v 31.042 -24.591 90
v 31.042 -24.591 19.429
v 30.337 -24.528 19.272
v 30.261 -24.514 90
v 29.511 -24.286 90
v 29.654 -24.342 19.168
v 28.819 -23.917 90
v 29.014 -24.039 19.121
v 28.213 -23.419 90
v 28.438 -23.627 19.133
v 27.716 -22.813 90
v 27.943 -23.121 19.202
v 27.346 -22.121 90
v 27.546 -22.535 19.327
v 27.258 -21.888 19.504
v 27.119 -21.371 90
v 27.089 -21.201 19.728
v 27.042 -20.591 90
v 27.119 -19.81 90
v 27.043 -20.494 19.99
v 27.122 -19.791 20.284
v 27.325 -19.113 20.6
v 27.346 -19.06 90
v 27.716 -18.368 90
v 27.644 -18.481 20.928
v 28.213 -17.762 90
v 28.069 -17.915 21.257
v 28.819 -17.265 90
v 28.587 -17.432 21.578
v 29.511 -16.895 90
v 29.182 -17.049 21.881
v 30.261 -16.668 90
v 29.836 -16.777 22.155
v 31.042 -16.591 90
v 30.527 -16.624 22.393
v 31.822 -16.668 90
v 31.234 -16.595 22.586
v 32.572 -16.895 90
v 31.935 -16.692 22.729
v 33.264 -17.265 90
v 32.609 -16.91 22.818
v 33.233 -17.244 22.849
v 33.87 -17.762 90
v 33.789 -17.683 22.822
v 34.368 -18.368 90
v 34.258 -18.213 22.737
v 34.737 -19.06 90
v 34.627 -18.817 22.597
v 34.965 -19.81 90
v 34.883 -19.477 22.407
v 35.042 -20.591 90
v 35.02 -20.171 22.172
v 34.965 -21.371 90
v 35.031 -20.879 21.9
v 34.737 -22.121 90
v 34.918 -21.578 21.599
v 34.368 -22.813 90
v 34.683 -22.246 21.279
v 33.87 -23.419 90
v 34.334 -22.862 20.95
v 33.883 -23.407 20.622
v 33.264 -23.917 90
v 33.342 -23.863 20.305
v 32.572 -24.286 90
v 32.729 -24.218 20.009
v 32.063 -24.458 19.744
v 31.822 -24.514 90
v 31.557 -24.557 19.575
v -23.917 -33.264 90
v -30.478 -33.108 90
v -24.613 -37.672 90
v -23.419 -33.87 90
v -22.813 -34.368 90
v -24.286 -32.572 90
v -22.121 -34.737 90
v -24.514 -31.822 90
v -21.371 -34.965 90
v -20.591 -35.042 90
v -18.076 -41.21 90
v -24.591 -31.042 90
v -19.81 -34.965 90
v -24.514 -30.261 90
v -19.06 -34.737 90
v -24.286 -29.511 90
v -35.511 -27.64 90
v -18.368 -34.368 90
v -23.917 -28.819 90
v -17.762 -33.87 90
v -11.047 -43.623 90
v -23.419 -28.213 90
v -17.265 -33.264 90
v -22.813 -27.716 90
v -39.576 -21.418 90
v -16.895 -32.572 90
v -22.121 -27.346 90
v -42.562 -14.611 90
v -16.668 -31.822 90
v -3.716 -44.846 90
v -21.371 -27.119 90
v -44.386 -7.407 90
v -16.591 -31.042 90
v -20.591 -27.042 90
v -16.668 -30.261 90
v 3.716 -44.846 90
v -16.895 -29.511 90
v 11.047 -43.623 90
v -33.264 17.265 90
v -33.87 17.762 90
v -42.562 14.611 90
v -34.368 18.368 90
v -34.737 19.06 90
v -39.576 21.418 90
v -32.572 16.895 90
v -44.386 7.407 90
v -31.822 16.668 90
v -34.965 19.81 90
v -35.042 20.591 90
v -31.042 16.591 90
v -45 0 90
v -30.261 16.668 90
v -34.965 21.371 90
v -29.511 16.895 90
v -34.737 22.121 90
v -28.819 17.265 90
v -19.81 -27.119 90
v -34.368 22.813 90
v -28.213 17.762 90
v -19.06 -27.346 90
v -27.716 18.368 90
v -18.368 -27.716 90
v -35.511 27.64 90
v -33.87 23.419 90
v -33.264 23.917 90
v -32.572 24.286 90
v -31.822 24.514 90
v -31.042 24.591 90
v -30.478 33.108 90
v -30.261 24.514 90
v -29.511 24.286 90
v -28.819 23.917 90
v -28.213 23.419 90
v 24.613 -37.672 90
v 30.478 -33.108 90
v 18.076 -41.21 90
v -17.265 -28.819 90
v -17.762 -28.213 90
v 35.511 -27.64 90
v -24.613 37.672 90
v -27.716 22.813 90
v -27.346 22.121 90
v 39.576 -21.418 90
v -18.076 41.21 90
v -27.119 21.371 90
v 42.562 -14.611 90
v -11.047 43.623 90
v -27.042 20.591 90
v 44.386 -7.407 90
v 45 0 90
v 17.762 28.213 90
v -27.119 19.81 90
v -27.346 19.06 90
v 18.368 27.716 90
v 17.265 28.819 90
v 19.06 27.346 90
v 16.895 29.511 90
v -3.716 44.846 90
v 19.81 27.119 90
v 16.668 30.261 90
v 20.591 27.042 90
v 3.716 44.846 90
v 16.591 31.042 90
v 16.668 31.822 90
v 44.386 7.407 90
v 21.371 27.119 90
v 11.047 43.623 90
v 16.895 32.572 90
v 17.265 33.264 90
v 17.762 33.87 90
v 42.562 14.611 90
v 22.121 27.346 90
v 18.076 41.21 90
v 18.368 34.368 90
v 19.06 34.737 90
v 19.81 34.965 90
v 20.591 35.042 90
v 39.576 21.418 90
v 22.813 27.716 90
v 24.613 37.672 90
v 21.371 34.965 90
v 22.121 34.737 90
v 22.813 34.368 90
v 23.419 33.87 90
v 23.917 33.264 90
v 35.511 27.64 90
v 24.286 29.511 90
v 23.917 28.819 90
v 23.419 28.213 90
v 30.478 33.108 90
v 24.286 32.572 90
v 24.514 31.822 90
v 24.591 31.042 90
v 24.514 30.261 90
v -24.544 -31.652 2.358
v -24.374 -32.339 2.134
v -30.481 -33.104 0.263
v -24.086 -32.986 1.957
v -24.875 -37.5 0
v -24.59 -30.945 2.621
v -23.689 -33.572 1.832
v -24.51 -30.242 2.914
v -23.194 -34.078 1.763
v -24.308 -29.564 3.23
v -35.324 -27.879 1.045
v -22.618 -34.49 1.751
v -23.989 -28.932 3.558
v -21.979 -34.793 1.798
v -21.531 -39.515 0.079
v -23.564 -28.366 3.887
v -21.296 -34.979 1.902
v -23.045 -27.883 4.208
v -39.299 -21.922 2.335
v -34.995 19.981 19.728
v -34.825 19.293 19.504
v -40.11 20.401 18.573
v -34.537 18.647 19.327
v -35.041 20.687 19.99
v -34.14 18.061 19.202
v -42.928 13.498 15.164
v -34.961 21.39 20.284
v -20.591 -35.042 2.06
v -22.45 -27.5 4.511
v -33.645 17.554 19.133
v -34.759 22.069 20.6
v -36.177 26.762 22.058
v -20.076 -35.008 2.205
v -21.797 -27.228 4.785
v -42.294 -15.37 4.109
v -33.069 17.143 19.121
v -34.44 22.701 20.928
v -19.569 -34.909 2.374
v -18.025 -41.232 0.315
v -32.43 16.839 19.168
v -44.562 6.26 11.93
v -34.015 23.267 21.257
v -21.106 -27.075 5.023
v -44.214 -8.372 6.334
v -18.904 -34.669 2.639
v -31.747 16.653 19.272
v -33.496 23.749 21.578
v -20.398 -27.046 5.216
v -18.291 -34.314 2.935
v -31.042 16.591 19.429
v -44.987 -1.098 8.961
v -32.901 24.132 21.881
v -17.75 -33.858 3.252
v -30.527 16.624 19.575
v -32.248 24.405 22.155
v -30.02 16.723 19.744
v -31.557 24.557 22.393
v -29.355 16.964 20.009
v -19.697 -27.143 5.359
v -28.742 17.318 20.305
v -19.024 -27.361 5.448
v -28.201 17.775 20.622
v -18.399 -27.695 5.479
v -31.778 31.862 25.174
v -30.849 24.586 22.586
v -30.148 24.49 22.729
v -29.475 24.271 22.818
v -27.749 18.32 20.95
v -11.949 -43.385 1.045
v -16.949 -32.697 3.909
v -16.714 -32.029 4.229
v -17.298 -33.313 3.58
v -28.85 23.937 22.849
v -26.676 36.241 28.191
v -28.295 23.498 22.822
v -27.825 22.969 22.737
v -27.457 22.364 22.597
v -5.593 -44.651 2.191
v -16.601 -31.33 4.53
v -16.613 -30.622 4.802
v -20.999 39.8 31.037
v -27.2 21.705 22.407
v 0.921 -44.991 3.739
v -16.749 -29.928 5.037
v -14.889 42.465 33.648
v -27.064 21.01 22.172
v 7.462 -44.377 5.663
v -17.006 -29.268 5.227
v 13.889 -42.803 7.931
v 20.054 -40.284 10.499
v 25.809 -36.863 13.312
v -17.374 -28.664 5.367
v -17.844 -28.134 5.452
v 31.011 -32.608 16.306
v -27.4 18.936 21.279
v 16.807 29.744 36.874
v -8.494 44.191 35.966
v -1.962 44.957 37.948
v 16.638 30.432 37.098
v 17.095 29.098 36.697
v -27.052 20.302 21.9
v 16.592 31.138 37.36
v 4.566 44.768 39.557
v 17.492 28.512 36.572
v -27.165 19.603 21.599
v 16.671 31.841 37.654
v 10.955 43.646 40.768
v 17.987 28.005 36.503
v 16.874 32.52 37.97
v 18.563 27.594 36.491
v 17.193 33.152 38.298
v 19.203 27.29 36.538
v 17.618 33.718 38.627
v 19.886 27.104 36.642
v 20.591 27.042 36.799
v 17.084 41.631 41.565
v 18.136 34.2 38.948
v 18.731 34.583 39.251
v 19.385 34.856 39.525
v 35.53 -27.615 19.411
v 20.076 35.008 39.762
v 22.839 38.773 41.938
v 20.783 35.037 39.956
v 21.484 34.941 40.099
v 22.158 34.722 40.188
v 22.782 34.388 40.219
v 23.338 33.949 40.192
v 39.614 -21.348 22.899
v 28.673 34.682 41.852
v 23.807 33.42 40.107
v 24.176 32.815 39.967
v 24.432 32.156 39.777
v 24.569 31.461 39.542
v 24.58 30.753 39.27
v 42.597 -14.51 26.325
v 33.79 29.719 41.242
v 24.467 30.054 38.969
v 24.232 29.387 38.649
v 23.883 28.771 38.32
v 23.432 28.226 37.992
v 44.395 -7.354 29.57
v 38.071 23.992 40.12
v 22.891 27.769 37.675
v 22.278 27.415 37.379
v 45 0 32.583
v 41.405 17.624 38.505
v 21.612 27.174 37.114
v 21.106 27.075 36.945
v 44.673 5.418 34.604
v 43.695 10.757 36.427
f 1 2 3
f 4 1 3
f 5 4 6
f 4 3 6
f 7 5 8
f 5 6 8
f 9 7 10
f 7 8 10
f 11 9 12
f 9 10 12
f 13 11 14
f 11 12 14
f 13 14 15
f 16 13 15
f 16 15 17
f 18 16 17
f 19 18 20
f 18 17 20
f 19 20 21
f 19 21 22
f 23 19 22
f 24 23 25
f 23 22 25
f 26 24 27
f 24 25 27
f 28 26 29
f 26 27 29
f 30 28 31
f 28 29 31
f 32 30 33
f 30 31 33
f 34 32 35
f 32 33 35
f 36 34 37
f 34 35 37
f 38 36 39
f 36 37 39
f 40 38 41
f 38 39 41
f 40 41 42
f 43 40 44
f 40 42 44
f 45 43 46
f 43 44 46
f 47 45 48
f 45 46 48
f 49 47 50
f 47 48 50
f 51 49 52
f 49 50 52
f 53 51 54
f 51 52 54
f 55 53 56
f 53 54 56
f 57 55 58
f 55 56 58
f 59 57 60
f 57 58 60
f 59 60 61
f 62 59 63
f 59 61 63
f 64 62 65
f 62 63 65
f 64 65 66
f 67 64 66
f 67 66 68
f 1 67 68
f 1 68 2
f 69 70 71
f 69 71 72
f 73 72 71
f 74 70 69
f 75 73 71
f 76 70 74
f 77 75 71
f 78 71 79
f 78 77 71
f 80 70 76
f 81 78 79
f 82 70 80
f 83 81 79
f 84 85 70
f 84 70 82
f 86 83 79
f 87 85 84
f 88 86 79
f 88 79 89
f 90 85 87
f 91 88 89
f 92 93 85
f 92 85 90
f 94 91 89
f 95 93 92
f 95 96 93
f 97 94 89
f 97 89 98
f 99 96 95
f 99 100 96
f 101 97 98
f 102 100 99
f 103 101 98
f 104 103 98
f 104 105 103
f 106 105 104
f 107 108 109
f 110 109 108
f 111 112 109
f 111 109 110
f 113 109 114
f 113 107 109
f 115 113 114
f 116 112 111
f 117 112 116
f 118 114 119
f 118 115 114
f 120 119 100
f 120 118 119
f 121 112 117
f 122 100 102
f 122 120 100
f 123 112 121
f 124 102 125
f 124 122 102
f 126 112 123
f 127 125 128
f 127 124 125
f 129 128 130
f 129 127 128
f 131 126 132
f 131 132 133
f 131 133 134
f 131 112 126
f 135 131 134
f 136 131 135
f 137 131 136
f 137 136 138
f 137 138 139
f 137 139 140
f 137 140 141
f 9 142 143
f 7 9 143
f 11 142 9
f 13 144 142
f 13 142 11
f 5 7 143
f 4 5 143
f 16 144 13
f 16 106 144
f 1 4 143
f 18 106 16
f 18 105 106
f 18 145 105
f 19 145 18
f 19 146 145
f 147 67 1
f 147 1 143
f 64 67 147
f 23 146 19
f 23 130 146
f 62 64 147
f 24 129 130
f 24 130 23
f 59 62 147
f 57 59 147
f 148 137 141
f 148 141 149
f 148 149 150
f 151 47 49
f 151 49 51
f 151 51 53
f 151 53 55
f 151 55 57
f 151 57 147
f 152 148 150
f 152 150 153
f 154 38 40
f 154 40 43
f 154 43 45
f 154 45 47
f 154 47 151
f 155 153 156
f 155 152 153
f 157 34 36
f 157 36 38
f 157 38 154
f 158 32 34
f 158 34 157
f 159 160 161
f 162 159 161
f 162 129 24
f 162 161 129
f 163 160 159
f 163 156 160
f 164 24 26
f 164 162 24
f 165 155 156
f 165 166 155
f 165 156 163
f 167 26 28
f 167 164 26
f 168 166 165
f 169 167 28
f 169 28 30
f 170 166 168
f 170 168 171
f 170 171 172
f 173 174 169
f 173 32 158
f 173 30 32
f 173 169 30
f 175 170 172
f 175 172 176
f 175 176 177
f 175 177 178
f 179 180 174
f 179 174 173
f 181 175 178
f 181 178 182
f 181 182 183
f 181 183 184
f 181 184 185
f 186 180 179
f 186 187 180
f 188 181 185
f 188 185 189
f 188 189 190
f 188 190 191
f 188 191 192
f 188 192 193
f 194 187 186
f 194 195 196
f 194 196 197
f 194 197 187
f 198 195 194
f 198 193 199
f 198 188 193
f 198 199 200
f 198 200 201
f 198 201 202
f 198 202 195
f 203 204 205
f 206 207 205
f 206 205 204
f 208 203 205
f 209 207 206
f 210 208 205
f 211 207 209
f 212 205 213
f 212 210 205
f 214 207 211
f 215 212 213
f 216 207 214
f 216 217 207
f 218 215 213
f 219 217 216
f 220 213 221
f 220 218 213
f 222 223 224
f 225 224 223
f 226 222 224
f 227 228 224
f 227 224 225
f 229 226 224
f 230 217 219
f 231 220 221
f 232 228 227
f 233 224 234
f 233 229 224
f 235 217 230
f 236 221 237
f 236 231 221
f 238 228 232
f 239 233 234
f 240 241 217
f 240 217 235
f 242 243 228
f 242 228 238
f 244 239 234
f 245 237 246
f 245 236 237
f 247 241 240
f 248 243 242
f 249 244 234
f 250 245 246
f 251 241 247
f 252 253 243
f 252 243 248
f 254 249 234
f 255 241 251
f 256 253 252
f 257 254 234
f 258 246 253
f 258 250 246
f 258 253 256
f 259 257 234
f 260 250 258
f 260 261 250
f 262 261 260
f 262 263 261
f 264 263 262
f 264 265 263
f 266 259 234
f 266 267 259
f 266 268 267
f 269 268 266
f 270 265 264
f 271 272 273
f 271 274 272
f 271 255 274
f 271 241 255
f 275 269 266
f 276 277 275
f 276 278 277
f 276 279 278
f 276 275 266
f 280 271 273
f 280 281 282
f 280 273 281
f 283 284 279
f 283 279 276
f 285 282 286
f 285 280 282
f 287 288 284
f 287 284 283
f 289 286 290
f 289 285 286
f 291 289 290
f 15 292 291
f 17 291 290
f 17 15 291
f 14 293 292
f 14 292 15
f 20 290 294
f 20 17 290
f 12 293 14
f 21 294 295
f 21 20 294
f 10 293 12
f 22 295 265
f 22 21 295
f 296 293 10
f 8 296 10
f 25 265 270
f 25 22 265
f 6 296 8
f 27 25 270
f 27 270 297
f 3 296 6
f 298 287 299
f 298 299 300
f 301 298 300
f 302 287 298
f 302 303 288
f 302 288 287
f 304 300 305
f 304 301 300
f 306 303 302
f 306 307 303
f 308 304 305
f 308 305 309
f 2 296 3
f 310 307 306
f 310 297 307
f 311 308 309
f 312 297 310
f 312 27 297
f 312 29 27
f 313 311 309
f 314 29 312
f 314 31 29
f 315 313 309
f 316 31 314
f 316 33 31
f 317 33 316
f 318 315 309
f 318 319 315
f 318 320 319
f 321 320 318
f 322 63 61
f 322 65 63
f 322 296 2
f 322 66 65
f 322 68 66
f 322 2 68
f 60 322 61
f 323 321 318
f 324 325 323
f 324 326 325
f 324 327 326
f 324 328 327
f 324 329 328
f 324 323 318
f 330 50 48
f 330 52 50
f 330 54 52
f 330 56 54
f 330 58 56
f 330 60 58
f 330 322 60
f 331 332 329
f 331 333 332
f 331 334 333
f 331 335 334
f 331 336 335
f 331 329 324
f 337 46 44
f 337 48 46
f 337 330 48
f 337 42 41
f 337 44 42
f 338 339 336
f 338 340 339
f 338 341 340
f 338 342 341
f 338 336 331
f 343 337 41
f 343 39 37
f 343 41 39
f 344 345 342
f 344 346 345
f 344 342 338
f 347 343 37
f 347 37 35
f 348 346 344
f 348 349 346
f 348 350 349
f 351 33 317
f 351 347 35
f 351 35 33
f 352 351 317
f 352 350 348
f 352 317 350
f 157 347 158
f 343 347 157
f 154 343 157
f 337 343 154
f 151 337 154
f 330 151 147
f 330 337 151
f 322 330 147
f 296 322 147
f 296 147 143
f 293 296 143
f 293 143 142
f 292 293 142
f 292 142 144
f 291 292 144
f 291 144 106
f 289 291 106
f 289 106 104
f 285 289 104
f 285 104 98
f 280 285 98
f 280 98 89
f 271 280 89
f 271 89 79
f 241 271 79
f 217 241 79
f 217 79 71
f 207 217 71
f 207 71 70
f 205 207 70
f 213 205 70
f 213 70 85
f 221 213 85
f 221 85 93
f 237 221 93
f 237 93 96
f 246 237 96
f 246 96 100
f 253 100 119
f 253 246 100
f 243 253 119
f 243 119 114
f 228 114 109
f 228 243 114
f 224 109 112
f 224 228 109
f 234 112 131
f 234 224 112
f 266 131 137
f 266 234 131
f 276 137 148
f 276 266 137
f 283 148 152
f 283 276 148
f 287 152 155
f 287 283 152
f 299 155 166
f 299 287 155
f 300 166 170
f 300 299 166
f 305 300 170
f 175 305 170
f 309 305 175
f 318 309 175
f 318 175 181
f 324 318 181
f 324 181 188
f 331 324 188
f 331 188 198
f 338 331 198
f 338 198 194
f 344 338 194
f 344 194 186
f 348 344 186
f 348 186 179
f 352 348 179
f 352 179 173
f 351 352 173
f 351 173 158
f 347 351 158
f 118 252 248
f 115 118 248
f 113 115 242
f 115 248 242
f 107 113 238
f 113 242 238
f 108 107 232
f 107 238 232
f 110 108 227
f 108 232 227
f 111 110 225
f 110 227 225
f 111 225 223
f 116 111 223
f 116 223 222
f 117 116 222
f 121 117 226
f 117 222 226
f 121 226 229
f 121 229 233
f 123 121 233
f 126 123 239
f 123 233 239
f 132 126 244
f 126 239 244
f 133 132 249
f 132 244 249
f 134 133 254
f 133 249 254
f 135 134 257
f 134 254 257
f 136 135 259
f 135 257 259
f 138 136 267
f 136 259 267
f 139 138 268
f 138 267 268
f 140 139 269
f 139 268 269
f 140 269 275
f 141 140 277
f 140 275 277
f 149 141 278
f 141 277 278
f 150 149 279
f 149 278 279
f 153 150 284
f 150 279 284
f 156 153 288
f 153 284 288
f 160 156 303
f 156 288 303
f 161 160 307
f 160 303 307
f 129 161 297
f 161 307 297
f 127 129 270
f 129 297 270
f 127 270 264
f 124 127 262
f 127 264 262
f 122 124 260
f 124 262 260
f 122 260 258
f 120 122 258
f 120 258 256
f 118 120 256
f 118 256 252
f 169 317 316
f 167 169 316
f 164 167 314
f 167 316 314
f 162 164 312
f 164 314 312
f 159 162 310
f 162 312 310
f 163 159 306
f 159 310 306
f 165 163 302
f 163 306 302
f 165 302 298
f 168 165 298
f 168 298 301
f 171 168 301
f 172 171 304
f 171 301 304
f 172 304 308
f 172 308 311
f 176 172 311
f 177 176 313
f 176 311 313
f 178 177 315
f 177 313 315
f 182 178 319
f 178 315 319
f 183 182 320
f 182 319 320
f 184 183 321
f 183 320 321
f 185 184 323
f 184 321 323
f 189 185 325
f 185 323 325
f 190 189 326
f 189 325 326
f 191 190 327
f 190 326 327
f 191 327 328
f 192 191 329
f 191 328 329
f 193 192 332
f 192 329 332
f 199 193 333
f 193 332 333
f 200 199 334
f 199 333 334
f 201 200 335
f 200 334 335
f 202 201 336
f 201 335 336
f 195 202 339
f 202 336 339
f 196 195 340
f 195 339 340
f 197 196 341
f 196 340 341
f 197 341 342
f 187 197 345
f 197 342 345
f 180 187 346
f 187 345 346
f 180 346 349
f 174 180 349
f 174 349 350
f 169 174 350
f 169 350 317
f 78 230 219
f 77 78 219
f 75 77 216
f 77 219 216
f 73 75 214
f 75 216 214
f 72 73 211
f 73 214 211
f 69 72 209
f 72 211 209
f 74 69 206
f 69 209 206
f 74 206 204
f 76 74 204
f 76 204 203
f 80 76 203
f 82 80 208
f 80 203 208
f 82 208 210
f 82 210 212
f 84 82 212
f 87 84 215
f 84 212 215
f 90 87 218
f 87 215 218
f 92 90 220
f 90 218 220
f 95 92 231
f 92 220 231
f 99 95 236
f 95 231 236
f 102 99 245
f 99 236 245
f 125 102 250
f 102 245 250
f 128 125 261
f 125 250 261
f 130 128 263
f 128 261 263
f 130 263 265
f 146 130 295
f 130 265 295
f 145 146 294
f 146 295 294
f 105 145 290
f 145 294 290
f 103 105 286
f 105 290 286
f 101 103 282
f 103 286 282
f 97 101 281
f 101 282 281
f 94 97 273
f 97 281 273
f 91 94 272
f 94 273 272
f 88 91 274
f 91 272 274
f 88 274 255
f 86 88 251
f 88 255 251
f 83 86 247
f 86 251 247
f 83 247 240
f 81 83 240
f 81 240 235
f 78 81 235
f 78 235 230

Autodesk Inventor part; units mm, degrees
ref_plane "YZ Plane" through (0, 0, 0) normal (1, 0, 0) x (0, 1, 0)
ref_plane "Start plane" through (0, 0, 0) normal (0, 0, 1) x (1, 0, 0)
ref_plane "End plane" through (0, 0, 50) normal (0, 0, 1) x (1, 0, 0)
sketch "Sketch" plane through (0, 0, 0) normal (0, 0, 1) x (1, 0, 0)
  circle A0 centre (0, 0) radius 45
  dimension "d0" = 90
extrude "Body" add sketch "Sketch" along normal blind 90
sketch "Sketch5" plane through (0, 0, 0) normal (0, 0, -1) x (-1, 0, 0)
  line L0 (-37.5, -37.5) -> (-37.5, 42.1268)
  point P0 (0, 0)
ref_plane "Work Plane4" through (37.5, -24.8747, 0) normal (0.8333333, -0.5527708, 0) x (0.5527708, 0.8333333, 0)
sketch "Sketch6" plane through (37.5, -24.8747, 0) normal (0.8333333, -0.5527708, 0) x (0.5527708, 0.8333333, 0)
  line L0 (-45, 0) -> (45, 0) projected
  line L1 (-45, 0) -> (-45, 90) projected
  line L2 (-45, 0) -> (66.6399, 52.0585)
  line L3 (-45, 0) -> (55.6312, 0) construction
  line L4 (66.6399, 52.0585) -> (66.6399, 0)
  line L5 (-45, 0) -> (66.6399, 0)
  point P0 (0, 0)
  point P1 (45, 90)
  dimension "d9" = 25
extrude "Extrusion2" cut sketch "Sketch6" against normal blind 124.75
sketch "Sketch9" plane through (0, 0, 20.9838) normal (0.233611, 0.3521819, -0.9063078) x (-0.8333333, 0.5527708, 0)
  line L0 (0, -12.6785) -> (0, 0.5509) construction
  line L1 (0, -12.6785) -> (11.8004, -12.6785) construction
  ellipse E0 centre (0, 0) end of major axis (0, -49.652) minor radius 45 projected
  line L2 (0, 49.652) -> (100.5638, 49.652) construction
  ellipse E1 centre (0, 29.1675) end of major axis (45, 29.1675) minor radius 40.7839 projected
  line L3 (0, 69.9513) -> (0, -11.6164)
  point P0 (0, -8.8682)
sketch "Sketch7" plane through (0, 0, 90) normal (0, 0, 1) x (1, 0, 0)
  line L0 (0, 0) -> (37.25, 0) construction
  line L1 (144.8898, -42.1091) -> (-141.4436, 147.8231) projected
  circle A0 centre (0, 0) radius 45 projected
  line L2 (17.2325, 42.5693) -> (30.6003, 33.7021)
  circle A1 centre (0, 0) radius 45 projected
  line L3 (24.8747, 37.5) -> (0, 0)
  point P0 (20.5907, 31.0417)
  point P1 (20.5907, 31.0417)
  point P2 (-31.0417, 20.5907)
  point P3 (-31.0417, 20.5907)
  point P4 (-20.5907, -31.0417)
  point P5 (-20.5907, -31.0417)
  point P6 (31.0417, -20.5907)
  point P7 (31.0417, -20.5907)
  point P8 (25.3722, 36.5516)
  dimension "d12" = 37.25
  dimension "d26" = 360
hole "Hole1" at (20.5907, 31.0417, 90) at (-31.0417, 20.5907, 90) at (-20.5907, -31.0417, 90) at (31.0417, -20.5907, 90) direction (0, 0, -1) diameter 8 end up to surface
sketch "Sketch10" plane through (0, 0, 90) normal (0, 0, 1) x (1, 0, 0)
  point P0 (0, 0)
equation "\"G_H\" = 75"
equation "\"G_L\" = d8"
equation "\"G_OFFSET_START\" = 0"
equation "\"G_OFFSET_END\" = 0"
equation "\"G_D\" = 75"
equation "\"d8\" = 50"
properties part number "PN EN 10060 - 75 - 50" material "Steel, Mild"
